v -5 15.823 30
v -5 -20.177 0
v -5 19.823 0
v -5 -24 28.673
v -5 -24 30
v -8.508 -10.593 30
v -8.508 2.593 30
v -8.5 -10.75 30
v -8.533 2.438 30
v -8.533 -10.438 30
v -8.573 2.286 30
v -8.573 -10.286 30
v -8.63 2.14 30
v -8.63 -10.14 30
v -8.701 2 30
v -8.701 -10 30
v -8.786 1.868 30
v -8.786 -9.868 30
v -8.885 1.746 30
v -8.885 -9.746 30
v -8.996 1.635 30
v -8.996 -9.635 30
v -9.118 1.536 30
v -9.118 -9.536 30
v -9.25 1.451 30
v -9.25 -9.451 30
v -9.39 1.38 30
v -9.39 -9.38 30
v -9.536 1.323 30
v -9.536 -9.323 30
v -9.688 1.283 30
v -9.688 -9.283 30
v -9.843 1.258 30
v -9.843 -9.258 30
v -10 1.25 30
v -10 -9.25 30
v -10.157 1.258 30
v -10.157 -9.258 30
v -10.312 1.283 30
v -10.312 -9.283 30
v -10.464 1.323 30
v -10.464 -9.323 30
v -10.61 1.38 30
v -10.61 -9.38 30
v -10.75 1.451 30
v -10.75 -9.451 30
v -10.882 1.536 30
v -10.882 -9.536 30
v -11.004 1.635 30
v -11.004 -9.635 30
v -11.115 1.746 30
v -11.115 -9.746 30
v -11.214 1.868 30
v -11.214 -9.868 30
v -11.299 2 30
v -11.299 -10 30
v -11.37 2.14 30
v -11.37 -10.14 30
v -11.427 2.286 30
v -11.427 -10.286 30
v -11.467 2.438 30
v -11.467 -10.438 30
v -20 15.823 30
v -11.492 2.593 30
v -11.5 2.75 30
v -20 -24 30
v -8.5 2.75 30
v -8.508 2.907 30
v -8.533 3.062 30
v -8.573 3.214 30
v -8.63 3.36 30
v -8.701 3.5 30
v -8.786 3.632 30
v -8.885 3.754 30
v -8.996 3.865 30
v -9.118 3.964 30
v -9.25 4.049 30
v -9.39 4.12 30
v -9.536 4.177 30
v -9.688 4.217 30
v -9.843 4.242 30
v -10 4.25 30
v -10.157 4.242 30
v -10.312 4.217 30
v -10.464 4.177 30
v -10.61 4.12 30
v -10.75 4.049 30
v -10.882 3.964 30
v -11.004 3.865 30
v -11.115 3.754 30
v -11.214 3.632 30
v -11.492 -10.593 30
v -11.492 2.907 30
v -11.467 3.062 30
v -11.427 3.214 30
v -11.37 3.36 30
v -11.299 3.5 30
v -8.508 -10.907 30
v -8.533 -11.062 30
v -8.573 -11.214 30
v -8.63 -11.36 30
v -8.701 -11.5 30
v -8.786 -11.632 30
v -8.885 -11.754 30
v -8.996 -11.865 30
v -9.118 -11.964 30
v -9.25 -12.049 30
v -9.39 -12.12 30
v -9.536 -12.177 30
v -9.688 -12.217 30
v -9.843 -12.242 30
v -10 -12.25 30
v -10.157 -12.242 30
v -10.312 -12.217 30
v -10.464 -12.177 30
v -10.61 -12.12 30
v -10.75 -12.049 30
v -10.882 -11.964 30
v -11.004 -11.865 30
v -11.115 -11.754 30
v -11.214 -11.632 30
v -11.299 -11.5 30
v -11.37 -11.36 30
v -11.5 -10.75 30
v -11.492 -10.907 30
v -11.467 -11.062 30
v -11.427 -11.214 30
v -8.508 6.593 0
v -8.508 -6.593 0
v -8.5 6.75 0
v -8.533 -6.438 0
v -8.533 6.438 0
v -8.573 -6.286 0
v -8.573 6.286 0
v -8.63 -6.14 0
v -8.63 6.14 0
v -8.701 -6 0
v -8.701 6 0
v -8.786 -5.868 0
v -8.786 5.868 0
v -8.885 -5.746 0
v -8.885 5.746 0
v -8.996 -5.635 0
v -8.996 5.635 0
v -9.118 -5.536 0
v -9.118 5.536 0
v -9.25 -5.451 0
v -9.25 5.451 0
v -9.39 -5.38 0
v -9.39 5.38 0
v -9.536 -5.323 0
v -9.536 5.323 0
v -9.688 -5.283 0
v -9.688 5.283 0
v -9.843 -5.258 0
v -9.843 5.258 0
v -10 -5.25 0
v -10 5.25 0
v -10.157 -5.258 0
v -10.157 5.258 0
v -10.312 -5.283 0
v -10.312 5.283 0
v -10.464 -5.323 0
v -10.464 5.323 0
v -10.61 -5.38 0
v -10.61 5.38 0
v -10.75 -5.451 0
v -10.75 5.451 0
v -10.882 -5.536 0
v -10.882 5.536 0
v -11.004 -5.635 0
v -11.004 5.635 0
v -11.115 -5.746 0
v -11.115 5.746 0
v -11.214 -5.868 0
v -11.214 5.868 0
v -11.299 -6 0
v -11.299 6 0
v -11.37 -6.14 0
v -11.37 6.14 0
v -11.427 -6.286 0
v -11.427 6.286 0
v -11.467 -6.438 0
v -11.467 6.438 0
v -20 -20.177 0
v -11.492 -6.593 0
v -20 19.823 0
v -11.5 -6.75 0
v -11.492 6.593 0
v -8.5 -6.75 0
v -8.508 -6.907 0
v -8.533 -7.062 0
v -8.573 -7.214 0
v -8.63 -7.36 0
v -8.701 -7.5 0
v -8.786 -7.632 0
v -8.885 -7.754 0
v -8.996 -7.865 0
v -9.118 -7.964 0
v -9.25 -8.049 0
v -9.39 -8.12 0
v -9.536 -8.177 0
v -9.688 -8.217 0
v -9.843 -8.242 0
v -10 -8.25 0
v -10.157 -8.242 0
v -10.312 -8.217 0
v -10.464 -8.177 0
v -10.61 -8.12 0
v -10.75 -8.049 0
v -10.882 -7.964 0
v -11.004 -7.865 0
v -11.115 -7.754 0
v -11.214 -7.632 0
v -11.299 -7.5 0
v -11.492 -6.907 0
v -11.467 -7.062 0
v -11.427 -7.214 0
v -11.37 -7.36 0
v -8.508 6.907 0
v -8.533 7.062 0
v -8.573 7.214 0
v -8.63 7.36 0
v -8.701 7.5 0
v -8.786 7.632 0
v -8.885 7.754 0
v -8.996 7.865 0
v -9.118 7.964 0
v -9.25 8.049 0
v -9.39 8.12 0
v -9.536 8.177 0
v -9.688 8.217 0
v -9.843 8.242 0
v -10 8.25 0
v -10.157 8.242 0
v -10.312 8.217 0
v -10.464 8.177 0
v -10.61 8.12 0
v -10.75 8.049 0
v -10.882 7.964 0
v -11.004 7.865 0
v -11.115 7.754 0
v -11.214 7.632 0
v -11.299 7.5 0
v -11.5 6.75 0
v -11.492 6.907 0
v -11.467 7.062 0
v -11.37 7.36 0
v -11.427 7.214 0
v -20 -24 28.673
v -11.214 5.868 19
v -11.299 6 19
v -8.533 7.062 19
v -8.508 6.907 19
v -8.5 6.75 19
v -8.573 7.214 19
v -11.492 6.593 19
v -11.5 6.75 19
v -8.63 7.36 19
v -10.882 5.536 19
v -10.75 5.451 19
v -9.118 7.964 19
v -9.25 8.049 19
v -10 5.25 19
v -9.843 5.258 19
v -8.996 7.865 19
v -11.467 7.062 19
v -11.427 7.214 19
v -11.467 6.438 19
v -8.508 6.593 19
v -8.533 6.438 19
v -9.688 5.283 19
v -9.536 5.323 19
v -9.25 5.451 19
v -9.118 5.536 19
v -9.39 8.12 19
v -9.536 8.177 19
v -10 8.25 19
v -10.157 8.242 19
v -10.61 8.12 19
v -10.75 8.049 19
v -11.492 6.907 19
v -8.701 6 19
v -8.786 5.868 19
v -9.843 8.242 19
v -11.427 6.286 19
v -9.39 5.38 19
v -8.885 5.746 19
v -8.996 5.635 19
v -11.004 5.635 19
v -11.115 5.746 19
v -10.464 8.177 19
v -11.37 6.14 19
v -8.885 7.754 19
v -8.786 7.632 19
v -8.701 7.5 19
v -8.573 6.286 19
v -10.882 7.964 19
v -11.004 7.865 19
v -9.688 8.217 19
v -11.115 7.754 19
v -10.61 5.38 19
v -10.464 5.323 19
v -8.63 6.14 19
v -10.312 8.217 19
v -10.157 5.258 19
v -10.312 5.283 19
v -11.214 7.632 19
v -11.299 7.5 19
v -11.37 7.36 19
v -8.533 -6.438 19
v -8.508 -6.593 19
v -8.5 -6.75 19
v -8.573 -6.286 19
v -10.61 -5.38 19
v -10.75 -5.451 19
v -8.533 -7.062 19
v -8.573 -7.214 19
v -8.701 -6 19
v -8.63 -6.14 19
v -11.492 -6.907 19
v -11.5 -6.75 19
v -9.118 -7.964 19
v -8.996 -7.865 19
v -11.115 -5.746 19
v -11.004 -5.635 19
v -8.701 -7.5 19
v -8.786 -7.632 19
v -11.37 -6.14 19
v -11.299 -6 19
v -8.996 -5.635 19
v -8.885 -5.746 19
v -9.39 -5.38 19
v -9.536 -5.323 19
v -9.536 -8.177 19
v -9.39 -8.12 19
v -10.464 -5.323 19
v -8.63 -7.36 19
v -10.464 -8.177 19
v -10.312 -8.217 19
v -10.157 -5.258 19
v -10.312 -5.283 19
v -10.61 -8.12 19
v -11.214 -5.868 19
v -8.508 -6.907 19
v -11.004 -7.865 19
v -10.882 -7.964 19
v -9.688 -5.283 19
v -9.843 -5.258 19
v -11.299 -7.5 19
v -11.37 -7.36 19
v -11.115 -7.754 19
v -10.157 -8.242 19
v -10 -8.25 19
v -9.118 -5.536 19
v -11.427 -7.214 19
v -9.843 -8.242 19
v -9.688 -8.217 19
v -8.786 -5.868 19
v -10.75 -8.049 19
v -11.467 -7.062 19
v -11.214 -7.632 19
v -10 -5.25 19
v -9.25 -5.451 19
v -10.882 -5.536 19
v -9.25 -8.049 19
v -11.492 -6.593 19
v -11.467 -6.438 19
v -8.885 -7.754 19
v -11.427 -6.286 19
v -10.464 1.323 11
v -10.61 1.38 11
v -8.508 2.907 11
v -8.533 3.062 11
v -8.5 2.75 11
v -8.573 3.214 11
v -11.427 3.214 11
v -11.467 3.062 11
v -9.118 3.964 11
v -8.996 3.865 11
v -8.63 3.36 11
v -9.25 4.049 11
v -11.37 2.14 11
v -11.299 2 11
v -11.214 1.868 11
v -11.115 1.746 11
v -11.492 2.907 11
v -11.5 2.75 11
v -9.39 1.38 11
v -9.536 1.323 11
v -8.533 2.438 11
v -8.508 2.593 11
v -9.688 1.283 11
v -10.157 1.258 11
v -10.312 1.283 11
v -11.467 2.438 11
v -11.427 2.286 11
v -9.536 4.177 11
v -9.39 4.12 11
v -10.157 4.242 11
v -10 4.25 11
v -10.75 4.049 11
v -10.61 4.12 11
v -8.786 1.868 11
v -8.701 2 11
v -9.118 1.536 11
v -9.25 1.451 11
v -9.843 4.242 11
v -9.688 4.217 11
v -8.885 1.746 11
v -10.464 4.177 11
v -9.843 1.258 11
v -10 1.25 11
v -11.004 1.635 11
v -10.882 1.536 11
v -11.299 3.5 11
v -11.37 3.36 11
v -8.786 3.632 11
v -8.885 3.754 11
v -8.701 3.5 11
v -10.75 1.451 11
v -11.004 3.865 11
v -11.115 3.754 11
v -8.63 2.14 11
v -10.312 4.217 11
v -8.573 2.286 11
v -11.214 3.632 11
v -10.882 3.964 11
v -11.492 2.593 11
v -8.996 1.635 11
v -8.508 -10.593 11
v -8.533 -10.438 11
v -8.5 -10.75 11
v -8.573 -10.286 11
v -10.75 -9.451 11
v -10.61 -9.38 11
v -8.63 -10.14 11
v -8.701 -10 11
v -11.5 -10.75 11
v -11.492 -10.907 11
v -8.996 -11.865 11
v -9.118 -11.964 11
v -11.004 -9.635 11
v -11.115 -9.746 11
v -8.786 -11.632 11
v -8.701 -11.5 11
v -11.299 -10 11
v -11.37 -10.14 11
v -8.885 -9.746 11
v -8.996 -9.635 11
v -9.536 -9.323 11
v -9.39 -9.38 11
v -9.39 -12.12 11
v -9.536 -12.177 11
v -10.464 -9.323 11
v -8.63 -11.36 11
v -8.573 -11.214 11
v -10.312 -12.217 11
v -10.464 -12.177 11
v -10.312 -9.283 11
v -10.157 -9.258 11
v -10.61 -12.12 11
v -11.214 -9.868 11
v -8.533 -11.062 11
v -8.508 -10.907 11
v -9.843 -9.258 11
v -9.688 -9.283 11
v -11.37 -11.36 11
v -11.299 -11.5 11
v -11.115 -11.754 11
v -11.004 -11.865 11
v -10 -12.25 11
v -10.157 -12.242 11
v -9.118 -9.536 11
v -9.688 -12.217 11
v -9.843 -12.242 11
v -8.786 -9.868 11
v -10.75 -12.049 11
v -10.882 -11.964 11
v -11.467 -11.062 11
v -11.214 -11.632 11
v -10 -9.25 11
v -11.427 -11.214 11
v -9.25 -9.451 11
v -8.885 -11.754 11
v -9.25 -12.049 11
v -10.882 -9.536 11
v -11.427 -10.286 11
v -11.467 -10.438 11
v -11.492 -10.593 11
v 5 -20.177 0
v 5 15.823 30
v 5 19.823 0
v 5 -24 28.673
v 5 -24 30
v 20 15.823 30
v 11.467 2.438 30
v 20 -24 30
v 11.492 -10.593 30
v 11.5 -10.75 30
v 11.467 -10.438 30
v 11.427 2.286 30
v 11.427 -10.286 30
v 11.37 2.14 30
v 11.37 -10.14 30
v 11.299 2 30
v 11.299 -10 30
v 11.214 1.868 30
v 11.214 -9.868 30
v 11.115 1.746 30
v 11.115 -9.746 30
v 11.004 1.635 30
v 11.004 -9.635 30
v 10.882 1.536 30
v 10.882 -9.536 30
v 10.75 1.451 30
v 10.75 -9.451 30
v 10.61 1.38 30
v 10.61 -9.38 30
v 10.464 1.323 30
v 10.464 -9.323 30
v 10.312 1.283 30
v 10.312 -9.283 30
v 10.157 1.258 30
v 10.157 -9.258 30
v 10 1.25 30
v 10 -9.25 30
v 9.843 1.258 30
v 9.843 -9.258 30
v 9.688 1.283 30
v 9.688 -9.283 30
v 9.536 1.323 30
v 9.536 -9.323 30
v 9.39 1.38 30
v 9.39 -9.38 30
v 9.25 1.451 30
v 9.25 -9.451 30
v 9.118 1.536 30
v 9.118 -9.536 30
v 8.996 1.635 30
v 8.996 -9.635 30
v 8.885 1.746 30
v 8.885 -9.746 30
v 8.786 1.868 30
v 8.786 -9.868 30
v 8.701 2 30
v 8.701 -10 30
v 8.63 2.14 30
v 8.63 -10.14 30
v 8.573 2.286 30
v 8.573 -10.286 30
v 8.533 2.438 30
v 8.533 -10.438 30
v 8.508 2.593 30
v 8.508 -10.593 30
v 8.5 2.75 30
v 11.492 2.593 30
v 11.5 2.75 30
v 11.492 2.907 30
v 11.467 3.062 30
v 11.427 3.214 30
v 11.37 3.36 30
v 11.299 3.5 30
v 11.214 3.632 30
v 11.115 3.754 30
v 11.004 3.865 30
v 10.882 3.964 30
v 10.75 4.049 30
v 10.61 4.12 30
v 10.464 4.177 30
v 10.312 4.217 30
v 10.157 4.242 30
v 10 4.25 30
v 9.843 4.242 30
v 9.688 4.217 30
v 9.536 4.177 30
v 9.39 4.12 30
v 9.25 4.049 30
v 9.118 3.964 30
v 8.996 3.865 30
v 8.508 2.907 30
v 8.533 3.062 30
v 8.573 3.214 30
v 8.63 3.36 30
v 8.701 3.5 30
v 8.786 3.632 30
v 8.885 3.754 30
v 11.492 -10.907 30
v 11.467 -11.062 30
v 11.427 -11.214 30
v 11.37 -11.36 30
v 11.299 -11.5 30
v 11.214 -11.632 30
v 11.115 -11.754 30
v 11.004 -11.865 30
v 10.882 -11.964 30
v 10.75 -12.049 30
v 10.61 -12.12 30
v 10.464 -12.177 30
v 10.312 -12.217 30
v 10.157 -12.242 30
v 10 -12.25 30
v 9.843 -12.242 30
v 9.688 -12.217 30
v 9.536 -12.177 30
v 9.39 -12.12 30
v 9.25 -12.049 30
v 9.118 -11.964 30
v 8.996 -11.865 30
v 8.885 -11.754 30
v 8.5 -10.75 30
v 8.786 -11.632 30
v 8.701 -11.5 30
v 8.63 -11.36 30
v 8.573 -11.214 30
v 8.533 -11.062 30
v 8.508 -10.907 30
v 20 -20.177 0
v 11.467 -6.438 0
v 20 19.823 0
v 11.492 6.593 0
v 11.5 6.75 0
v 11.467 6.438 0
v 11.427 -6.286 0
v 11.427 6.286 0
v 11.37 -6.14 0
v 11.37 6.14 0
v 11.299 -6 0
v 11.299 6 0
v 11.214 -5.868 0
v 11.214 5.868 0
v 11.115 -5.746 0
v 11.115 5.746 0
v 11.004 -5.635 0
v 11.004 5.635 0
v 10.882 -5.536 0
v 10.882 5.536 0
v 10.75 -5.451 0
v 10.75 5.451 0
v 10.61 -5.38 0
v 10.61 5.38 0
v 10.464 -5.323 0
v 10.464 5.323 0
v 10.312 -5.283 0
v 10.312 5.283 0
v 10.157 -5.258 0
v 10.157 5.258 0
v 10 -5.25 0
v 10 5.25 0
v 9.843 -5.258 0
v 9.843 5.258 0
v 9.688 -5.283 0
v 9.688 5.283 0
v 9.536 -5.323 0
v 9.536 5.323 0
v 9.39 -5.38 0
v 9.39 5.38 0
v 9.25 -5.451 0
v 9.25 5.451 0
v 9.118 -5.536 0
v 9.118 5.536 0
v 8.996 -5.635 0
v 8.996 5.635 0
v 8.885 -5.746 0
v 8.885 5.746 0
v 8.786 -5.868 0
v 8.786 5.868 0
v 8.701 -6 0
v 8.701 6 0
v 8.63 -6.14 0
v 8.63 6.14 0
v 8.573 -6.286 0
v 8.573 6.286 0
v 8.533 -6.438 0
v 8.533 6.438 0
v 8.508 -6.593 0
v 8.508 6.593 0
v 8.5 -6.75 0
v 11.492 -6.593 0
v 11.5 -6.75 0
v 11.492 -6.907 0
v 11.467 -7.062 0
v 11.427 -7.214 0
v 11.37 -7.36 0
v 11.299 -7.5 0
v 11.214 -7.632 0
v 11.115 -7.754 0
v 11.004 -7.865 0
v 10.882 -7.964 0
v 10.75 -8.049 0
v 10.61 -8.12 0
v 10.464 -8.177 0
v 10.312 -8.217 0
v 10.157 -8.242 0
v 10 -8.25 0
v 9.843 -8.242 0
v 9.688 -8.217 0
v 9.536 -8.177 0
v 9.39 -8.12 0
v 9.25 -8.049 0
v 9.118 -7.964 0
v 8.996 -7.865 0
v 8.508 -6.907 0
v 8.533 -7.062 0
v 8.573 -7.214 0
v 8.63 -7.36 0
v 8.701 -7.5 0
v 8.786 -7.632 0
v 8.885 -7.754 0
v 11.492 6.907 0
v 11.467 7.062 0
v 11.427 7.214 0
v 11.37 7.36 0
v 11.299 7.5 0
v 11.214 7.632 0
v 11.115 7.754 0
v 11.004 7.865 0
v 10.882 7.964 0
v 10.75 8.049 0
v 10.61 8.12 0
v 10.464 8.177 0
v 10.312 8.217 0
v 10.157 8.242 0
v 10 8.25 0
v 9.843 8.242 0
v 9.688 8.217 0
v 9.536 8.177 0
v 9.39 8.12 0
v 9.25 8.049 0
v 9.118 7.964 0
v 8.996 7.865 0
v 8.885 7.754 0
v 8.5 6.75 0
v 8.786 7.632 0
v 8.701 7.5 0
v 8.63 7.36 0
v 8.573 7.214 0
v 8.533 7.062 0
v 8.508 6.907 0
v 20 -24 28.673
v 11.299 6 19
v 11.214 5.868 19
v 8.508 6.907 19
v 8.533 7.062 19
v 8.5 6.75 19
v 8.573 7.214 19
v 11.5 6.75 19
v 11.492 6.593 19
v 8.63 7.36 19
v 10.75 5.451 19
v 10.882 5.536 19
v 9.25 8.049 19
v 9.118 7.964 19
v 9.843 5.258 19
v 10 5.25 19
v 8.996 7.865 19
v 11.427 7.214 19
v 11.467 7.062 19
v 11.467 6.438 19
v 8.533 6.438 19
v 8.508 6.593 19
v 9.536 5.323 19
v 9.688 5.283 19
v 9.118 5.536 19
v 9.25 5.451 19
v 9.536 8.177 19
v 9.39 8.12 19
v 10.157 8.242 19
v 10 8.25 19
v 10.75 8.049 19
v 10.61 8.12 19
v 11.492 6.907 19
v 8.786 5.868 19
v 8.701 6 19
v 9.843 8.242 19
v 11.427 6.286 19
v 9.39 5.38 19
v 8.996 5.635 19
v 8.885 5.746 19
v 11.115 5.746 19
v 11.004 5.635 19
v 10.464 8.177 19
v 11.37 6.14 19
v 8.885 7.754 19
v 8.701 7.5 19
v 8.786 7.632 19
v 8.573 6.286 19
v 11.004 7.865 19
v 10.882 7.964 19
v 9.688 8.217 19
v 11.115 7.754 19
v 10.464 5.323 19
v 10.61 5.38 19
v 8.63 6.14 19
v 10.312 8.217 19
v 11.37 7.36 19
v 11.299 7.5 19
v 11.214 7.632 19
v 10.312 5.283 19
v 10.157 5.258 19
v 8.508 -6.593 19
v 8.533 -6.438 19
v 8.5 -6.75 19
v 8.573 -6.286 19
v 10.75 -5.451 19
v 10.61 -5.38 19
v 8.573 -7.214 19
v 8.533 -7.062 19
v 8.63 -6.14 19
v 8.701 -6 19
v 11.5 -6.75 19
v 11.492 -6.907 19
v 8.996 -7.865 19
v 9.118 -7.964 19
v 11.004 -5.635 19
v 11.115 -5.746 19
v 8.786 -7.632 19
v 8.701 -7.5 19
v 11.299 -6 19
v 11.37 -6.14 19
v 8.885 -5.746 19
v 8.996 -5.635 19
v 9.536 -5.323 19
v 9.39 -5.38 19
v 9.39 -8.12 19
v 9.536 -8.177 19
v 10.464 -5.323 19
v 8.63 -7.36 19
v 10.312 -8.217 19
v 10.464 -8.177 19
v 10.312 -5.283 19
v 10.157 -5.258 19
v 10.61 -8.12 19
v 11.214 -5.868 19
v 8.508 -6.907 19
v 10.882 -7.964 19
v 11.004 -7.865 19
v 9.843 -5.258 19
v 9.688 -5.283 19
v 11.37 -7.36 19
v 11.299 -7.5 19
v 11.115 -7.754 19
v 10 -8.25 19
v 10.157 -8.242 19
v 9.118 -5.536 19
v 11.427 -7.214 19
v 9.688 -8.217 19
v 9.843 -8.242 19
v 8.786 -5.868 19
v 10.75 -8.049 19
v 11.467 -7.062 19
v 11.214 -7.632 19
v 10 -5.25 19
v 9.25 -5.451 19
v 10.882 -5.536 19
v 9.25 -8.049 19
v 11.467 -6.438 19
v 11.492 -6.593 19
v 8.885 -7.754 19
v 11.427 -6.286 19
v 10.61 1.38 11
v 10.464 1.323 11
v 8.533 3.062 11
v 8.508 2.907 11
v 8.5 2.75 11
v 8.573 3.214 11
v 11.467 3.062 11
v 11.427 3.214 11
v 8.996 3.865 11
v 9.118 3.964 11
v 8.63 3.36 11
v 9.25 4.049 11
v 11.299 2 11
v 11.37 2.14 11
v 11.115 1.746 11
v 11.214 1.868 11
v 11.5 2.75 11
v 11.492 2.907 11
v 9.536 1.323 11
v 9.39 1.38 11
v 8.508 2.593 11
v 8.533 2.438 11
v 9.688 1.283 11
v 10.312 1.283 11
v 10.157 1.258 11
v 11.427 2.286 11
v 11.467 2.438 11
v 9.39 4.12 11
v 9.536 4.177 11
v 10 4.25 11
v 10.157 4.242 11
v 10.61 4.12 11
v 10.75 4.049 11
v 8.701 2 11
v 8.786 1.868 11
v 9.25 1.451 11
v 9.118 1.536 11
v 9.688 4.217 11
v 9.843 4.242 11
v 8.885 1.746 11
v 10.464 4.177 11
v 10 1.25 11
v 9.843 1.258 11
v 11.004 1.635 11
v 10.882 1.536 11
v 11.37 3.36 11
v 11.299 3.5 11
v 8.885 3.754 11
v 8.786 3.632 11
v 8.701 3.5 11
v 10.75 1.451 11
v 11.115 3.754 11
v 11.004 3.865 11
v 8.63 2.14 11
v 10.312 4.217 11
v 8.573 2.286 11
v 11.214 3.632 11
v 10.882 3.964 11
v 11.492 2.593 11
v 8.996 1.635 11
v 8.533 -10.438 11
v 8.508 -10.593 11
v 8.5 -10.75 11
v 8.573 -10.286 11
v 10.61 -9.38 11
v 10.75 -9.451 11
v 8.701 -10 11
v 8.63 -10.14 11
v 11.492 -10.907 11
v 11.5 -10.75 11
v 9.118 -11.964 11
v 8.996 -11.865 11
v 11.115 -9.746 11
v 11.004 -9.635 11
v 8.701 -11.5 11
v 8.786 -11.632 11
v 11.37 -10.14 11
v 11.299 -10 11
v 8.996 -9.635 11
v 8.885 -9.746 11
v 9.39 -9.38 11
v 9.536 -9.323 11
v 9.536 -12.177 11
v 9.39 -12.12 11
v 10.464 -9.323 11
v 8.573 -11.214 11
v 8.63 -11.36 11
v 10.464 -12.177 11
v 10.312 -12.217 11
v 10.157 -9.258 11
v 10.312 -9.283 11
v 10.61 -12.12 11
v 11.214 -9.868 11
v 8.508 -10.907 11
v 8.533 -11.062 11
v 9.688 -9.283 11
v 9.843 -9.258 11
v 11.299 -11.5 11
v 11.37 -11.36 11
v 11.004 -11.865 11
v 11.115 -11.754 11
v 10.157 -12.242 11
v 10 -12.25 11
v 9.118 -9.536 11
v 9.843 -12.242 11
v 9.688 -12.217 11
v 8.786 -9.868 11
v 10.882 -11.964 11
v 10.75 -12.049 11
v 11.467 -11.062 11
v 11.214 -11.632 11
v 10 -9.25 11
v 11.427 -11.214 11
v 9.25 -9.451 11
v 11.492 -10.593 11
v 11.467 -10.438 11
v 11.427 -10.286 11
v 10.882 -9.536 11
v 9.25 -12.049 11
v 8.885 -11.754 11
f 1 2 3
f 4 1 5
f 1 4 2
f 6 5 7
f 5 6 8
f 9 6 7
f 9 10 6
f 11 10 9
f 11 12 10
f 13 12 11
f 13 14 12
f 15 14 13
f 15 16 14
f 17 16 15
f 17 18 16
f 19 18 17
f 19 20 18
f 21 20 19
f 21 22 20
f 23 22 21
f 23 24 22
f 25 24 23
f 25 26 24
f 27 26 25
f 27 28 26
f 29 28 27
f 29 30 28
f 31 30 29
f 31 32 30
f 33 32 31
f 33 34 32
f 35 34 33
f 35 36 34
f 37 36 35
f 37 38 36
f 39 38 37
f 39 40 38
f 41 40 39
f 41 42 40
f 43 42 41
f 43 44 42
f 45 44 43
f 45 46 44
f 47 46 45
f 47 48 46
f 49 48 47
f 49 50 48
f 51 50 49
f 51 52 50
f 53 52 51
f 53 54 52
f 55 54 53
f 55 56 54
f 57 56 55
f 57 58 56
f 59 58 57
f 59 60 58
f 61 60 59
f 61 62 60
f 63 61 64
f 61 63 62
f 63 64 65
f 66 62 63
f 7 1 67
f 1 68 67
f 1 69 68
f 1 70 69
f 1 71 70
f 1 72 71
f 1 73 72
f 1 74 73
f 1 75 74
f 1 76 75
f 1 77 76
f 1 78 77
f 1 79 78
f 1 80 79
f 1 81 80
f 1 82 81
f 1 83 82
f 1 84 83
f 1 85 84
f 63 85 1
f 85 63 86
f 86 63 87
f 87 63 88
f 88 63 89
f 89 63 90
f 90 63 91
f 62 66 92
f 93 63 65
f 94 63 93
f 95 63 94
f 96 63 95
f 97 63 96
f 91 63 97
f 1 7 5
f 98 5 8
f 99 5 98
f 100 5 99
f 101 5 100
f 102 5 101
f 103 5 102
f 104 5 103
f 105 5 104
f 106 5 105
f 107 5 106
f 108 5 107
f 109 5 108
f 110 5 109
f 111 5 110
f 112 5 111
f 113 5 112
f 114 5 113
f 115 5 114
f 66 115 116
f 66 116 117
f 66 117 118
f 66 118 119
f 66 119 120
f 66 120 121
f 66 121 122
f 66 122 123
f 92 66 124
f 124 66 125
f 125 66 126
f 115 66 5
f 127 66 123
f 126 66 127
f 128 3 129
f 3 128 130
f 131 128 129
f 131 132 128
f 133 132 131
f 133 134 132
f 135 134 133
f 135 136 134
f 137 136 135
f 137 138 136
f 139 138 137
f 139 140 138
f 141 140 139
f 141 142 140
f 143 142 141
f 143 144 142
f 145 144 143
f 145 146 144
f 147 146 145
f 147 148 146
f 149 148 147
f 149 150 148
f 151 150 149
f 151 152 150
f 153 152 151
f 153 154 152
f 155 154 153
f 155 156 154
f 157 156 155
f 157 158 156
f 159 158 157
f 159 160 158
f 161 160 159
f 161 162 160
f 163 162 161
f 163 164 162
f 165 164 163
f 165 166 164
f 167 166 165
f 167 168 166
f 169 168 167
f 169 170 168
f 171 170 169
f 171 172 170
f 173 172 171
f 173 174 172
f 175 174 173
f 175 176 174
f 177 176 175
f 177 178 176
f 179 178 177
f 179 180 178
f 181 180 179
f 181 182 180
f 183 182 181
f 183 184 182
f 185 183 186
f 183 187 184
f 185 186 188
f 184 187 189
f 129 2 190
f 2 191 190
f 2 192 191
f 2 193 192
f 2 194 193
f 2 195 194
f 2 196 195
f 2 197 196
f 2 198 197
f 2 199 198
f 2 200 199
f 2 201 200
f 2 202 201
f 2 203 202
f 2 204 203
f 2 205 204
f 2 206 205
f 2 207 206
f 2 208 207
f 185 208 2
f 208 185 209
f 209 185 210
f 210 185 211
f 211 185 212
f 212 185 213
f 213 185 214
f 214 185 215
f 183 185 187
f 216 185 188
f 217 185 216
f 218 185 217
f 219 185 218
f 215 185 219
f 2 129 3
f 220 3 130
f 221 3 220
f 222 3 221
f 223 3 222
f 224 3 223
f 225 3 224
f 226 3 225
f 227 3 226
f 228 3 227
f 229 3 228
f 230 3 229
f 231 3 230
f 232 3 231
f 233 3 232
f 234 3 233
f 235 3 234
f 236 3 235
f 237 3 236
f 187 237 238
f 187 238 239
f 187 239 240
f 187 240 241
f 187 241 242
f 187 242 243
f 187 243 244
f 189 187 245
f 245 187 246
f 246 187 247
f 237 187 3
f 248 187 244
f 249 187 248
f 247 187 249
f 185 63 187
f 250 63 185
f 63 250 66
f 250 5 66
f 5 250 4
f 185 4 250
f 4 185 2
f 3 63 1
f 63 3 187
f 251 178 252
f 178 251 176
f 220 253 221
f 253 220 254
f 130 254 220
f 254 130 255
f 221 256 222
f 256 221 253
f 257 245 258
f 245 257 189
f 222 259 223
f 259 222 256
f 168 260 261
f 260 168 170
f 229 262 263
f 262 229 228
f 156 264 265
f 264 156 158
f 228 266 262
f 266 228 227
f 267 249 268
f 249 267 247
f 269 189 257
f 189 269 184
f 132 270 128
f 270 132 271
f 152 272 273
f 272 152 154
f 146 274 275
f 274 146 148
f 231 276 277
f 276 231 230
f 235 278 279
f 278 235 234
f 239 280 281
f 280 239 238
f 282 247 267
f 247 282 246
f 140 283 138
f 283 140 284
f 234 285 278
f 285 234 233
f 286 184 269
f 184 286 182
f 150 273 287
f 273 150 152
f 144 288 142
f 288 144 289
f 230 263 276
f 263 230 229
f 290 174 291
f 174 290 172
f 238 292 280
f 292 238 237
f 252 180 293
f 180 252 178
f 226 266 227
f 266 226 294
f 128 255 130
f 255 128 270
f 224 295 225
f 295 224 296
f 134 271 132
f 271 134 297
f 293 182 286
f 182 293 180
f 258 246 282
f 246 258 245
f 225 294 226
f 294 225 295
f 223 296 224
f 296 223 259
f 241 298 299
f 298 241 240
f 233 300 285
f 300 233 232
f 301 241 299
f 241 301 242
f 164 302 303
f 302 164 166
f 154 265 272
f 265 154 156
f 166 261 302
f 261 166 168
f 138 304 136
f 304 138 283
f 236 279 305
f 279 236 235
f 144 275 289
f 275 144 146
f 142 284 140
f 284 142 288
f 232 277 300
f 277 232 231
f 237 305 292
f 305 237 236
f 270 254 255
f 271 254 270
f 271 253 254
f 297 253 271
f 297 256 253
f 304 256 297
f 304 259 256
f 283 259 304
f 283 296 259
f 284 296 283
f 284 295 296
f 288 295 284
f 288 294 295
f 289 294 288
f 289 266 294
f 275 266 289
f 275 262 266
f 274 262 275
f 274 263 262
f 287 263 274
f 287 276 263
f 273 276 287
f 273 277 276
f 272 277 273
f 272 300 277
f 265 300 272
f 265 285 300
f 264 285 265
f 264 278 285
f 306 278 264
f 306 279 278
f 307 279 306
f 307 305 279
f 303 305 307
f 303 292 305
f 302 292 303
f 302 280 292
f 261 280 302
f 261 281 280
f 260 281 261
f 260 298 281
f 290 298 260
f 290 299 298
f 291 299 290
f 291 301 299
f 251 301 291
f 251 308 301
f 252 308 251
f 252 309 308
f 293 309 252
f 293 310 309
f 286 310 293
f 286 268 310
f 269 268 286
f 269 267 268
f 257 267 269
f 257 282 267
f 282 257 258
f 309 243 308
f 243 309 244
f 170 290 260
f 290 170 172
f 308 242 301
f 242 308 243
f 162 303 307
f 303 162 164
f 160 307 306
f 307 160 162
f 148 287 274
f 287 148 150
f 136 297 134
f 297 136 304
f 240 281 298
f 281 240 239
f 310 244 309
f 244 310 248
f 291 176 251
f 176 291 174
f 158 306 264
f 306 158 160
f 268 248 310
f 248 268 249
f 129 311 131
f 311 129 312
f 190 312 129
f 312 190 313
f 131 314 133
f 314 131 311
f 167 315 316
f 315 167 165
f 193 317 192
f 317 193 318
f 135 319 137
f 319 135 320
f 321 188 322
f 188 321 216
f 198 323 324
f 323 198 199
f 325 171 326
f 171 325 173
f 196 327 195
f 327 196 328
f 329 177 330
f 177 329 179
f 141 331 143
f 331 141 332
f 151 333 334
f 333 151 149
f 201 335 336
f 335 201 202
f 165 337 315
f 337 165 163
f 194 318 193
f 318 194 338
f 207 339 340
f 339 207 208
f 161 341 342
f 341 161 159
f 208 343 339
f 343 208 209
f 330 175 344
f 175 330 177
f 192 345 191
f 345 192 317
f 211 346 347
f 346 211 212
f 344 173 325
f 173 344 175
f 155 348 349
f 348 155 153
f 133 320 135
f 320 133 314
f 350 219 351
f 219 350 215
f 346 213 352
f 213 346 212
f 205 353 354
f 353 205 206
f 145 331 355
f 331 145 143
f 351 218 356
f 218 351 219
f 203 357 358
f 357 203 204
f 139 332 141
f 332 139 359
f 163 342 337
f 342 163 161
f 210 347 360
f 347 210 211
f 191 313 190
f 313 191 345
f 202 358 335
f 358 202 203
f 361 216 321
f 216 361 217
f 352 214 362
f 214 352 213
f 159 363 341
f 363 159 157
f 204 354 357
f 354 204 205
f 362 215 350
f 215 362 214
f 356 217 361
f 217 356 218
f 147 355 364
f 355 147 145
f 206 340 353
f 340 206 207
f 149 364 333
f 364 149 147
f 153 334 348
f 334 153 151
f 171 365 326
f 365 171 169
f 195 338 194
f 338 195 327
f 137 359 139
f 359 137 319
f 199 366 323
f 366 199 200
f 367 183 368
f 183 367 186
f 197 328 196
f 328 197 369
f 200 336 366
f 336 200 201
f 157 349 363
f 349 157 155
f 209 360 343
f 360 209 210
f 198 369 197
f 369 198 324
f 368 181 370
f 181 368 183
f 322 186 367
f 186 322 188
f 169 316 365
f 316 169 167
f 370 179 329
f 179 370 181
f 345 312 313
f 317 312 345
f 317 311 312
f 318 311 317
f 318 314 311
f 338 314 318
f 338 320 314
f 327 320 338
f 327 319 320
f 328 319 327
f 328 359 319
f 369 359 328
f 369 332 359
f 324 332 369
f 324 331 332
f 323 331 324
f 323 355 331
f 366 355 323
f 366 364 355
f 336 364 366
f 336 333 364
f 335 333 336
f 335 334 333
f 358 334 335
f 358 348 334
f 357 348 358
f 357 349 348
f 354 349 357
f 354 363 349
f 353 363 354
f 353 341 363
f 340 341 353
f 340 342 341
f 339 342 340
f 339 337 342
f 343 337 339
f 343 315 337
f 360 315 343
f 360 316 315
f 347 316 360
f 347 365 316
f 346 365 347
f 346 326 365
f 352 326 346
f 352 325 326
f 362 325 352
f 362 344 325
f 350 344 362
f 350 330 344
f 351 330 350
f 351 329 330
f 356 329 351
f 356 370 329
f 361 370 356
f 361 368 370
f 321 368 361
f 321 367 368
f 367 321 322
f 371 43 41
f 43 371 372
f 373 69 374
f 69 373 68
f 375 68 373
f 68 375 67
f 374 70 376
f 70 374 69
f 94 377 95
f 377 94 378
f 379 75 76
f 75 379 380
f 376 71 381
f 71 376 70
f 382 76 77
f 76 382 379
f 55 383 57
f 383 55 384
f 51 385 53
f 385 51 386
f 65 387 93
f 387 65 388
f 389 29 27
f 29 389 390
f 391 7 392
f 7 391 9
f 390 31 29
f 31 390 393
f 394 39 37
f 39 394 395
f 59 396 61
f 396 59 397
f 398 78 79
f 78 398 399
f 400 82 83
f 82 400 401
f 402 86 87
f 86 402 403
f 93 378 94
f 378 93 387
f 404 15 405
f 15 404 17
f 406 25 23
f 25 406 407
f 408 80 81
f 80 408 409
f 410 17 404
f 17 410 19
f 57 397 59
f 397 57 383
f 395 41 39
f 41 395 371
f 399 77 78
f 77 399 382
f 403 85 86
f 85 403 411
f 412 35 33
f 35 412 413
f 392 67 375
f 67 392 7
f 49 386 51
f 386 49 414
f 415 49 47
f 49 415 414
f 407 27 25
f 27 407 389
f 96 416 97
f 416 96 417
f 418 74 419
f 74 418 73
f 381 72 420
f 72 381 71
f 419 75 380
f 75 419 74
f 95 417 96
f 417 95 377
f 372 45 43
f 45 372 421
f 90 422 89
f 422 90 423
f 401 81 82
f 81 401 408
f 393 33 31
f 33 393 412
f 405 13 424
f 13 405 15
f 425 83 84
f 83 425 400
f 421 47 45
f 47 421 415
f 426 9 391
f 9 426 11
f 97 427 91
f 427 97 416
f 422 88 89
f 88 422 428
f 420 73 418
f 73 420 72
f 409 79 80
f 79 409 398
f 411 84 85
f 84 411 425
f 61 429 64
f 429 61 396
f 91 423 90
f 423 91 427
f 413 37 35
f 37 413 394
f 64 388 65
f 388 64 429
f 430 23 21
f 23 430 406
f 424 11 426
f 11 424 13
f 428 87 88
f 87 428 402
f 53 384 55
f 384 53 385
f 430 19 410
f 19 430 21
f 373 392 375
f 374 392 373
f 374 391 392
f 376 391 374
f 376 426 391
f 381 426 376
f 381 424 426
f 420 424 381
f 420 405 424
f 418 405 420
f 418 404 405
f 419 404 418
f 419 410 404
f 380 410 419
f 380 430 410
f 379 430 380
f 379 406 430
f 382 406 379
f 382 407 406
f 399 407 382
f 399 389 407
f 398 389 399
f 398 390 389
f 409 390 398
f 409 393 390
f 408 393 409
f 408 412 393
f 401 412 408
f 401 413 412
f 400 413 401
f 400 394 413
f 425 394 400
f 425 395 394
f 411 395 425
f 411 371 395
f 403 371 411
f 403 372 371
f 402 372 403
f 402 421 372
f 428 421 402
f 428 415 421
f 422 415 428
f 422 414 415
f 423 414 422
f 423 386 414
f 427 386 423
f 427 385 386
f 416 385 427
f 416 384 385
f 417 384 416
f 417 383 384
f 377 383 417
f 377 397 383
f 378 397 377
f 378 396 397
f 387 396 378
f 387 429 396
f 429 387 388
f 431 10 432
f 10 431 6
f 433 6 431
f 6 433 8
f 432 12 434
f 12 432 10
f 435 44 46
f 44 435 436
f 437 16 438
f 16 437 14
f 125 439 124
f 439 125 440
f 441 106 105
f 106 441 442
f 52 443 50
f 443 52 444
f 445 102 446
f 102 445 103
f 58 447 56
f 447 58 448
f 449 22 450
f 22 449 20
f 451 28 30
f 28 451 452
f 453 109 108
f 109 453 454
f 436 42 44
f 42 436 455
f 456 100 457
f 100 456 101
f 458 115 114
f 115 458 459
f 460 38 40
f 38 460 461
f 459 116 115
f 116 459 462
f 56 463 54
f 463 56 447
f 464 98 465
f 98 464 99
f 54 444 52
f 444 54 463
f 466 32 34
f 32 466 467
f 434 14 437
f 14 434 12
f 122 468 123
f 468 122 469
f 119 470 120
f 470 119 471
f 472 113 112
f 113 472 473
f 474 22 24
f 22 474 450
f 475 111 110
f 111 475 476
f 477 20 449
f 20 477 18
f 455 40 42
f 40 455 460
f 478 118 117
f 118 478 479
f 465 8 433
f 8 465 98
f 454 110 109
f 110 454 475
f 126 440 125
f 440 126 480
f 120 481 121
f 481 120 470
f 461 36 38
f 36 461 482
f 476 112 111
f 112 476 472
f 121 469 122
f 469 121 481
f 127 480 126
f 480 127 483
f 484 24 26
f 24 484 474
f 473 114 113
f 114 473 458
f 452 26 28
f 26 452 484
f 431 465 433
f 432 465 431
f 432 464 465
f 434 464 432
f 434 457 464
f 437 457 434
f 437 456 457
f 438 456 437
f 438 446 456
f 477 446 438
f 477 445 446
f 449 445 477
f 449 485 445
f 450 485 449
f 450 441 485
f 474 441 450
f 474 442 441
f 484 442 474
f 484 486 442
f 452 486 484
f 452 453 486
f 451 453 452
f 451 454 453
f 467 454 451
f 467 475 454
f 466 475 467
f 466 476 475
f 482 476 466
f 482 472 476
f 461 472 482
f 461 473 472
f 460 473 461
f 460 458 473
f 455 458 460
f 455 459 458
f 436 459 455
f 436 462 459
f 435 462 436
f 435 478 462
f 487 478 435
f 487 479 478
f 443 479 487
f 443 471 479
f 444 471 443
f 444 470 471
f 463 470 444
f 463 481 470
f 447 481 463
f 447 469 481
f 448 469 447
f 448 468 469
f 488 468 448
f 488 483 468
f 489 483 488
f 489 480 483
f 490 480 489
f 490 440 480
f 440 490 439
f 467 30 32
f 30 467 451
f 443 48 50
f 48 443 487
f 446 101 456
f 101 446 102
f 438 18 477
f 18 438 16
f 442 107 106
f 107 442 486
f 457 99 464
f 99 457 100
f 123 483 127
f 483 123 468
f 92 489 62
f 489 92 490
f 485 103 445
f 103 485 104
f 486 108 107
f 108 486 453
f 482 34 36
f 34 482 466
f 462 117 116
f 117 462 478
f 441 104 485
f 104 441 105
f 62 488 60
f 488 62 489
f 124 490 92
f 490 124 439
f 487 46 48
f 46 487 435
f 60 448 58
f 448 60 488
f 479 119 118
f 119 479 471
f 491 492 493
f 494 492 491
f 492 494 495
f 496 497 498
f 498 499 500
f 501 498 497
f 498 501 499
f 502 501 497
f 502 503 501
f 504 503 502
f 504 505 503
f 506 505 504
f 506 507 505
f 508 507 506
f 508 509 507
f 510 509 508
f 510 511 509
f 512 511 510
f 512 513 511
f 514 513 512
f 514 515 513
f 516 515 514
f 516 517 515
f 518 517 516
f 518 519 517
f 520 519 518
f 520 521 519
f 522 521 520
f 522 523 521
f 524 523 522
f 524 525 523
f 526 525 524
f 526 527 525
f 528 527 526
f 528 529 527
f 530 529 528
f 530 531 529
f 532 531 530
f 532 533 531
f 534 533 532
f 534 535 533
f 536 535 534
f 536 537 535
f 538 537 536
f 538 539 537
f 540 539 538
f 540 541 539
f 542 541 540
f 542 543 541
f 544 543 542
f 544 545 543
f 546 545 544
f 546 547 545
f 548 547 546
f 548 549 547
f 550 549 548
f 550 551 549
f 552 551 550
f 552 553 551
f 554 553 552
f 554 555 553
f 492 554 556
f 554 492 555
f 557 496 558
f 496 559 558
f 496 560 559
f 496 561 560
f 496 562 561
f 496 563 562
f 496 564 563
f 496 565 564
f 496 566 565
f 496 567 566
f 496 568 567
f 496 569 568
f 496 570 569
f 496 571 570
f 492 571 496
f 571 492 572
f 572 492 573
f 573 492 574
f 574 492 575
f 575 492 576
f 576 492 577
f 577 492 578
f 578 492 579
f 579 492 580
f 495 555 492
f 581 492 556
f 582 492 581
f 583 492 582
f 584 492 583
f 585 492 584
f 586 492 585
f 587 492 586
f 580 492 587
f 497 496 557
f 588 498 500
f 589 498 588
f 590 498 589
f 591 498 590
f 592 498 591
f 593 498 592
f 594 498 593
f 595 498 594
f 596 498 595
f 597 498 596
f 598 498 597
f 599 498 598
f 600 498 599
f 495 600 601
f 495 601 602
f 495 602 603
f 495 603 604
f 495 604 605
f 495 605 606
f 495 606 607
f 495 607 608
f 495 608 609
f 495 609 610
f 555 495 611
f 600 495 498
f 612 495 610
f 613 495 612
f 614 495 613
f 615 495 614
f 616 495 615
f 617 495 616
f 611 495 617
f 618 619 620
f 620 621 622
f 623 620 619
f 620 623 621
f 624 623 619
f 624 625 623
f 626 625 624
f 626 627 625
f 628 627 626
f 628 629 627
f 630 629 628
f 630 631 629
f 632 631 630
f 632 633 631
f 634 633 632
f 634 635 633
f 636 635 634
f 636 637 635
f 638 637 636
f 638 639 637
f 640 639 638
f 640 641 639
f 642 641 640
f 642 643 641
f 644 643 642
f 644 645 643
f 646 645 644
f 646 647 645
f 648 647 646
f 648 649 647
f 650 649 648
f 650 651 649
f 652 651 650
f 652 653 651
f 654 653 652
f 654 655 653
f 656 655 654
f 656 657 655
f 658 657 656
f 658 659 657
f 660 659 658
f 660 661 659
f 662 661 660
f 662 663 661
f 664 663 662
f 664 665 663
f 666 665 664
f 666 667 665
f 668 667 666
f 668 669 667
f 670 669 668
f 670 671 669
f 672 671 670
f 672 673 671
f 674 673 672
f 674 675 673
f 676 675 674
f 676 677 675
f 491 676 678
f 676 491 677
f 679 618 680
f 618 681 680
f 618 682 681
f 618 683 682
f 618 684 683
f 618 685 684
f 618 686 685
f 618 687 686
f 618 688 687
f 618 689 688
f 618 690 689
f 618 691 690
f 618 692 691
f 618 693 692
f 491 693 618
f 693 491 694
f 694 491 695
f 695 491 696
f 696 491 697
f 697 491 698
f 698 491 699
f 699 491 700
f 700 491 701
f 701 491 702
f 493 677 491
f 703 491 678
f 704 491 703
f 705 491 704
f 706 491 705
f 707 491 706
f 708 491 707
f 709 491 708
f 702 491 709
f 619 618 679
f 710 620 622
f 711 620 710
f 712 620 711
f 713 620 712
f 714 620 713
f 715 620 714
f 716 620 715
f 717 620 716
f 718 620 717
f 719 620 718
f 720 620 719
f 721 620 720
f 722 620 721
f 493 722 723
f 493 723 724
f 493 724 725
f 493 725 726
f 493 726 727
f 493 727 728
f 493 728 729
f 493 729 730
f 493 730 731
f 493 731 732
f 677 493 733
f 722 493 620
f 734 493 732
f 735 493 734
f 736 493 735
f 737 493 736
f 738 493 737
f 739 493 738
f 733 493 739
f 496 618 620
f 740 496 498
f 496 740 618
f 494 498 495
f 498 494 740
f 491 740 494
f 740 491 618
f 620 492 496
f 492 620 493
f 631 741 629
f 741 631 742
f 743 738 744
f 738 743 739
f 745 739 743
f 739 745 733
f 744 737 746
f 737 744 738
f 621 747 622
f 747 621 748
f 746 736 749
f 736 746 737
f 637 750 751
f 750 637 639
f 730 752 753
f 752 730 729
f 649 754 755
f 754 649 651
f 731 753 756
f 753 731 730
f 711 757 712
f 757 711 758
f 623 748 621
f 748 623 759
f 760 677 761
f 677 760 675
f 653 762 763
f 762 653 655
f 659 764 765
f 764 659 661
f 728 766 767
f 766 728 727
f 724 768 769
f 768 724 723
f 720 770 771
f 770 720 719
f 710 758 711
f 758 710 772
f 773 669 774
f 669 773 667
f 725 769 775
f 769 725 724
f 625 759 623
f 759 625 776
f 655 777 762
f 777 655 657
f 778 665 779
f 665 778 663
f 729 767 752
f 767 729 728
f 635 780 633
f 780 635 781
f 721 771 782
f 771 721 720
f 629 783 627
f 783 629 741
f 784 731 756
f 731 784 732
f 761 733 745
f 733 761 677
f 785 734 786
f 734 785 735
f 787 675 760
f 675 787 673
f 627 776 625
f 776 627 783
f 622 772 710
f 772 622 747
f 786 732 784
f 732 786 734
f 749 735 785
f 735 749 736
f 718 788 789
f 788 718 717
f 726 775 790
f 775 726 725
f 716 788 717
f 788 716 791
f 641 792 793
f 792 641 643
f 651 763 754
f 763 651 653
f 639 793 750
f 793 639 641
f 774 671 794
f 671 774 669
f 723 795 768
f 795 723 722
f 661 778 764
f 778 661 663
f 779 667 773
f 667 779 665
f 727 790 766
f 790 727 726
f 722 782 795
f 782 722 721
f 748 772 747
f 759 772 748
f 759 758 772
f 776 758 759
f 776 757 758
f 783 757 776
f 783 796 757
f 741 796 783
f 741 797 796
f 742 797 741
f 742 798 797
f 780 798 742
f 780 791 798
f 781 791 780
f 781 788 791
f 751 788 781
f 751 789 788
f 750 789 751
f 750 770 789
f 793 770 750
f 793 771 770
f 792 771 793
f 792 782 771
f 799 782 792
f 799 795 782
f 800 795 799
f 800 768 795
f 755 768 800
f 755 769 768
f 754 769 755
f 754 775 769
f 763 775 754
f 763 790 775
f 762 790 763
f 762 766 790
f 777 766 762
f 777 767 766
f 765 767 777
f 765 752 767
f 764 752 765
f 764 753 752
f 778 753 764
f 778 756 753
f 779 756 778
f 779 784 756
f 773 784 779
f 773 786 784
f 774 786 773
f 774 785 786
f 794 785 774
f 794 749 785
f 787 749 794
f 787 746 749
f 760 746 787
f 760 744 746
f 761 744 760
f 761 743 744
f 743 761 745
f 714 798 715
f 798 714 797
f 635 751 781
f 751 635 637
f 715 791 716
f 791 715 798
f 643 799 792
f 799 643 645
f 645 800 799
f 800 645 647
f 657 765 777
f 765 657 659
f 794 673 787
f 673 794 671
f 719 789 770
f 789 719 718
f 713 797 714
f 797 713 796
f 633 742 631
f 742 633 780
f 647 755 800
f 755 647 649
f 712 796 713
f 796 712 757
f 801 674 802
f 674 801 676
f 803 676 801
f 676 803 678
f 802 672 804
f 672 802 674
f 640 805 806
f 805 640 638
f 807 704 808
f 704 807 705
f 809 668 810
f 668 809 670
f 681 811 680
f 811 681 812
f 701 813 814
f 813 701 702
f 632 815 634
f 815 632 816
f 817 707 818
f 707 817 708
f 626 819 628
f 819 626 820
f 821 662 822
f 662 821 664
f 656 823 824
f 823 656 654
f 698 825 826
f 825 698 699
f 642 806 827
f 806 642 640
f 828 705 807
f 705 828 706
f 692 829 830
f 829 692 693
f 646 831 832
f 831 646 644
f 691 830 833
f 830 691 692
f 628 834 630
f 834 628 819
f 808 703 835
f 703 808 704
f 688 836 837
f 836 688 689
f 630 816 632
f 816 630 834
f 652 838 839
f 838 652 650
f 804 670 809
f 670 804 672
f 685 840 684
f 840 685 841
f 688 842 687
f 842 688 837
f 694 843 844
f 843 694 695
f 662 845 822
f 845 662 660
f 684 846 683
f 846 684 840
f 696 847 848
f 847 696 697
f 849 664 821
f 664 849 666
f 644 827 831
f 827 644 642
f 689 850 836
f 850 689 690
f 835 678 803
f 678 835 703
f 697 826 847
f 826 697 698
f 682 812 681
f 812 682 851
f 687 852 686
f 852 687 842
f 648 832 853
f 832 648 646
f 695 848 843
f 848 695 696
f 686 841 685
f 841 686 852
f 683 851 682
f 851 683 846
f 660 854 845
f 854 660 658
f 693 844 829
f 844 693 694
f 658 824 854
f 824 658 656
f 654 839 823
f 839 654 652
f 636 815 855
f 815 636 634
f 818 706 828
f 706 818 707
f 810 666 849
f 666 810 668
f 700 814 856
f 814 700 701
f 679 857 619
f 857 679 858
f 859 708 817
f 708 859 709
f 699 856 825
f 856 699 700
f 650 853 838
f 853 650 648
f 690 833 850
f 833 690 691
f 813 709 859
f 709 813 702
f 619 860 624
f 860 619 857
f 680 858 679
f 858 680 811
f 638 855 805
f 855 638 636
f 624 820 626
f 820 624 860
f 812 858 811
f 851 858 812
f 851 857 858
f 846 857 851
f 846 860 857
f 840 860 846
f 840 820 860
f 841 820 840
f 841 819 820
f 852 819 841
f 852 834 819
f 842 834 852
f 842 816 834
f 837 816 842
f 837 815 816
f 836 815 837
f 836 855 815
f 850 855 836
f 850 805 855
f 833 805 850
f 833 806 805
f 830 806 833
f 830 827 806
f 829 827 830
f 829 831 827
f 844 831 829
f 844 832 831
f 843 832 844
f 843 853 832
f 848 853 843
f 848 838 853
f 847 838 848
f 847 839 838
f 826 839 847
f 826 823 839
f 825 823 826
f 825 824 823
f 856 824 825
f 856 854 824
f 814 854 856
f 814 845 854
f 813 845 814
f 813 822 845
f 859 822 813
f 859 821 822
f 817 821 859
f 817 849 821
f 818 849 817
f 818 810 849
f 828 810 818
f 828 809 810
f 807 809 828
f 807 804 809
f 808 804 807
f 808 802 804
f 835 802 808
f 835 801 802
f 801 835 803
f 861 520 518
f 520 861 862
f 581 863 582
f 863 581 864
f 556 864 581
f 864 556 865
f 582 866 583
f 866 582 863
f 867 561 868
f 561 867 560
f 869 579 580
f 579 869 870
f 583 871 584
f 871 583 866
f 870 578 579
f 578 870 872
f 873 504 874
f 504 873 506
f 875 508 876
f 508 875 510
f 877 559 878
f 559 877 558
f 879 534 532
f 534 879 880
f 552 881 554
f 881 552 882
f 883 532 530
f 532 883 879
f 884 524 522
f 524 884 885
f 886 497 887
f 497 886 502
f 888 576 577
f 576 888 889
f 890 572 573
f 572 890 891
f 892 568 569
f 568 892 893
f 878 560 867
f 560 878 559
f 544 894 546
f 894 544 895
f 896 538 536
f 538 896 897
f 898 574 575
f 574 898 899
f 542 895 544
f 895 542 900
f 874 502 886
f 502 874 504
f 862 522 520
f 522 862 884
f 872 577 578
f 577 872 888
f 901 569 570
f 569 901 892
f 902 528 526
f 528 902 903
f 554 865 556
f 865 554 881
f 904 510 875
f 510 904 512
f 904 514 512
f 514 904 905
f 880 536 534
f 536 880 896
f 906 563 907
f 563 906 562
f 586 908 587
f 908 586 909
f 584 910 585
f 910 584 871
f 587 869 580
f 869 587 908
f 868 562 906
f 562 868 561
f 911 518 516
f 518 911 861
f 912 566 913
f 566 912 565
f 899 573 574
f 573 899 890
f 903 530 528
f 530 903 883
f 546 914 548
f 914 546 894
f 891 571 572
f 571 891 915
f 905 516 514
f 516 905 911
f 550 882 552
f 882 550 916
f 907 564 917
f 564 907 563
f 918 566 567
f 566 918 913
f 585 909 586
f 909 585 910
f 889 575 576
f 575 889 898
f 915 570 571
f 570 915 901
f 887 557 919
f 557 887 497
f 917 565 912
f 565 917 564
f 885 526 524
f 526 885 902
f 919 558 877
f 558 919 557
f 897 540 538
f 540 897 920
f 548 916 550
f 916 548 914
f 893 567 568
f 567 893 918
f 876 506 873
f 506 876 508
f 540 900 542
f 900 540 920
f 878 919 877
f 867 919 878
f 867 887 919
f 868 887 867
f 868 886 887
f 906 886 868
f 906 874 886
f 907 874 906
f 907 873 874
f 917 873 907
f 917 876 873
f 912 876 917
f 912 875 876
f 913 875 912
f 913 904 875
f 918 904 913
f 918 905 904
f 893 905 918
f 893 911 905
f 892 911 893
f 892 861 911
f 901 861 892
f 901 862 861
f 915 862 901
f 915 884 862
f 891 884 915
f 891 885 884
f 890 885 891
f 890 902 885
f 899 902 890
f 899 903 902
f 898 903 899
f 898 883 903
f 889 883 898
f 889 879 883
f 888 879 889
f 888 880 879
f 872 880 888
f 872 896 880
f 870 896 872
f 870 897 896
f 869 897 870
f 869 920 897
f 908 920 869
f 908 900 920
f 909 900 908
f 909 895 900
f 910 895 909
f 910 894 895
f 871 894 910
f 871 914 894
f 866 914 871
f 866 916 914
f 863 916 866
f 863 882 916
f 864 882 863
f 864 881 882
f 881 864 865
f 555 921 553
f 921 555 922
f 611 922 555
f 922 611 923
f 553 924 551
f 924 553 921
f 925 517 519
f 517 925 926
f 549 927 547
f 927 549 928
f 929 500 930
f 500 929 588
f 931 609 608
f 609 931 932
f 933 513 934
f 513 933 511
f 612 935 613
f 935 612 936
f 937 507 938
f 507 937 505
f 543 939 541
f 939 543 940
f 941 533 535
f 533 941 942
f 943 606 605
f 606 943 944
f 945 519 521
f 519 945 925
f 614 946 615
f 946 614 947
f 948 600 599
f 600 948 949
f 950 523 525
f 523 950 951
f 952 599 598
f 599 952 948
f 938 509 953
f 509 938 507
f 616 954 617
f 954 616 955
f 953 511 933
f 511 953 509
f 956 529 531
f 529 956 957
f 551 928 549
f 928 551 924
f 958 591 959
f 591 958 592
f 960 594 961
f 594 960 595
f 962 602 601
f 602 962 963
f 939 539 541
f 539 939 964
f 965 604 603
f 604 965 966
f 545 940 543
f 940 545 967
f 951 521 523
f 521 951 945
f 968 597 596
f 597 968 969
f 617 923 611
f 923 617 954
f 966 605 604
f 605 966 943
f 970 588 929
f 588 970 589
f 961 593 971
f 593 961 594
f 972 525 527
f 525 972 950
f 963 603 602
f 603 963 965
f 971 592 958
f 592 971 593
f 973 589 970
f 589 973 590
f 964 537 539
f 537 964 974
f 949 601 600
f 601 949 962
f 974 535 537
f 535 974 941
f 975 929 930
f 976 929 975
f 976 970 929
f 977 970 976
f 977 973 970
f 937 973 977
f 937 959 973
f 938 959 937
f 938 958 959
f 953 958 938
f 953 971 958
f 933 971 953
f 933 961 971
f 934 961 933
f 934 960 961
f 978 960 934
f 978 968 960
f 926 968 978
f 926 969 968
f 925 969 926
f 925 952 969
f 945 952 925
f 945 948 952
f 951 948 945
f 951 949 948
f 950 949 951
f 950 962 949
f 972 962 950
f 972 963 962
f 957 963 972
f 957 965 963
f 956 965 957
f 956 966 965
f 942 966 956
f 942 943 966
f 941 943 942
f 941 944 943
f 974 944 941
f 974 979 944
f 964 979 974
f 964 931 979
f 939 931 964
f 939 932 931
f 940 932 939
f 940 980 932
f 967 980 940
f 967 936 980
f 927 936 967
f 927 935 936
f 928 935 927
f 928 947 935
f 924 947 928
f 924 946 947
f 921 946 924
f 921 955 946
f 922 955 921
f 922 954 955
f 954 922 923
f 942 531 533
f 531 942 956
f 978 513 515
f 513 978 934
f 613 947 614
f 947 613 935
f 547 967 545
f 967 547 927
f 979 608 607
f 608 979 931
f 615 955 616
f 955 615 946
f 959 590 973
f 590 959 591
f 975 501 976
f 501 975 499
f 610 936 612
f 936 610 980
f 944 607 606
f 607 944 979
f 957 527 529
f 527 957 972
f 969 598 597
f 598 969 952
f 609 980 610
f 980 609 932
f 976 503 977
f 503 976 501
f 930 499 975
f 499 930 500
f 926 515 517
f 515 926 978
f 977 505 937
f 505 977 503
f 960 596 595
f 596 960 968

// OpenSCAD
H = 30;
dv1 = 3;
hv1 = 9;
hv2 = 19;
e = 4;
alpha = atan(e/H);

W = 15;
L = 40;

module support() 
translate([-W-5,0,0])
difference() {
	// pièce
	intersection() {
		translate([0,-L/2-e,0]) cube([W,L+e,H]);
		rotate([alpha,0,0]) translate([0,-L/2,-10]) cube([W,cos(alpha)*L,H*2]);
	}

	// vis
	# color("red") {
		translate([10, 13.5/2, -1]) cylinder(h=hv2+1,d=dv1,$fn=60);
		translate([10, -13.5/2, -1]) cylinder(h=hv2+1,d=dv1,$fn=60);
		
		translate([10, 13.5/2-e, H-hv2]) cylinder(h=hv2+1,d=dv1,$fn=60);
		translate([10, -13.5/2-e, H-hv2]) cylinder(h=hv2+1,d=dv1,$fn=60);
	}
}

support();

mirror([1,0,0]) support();
